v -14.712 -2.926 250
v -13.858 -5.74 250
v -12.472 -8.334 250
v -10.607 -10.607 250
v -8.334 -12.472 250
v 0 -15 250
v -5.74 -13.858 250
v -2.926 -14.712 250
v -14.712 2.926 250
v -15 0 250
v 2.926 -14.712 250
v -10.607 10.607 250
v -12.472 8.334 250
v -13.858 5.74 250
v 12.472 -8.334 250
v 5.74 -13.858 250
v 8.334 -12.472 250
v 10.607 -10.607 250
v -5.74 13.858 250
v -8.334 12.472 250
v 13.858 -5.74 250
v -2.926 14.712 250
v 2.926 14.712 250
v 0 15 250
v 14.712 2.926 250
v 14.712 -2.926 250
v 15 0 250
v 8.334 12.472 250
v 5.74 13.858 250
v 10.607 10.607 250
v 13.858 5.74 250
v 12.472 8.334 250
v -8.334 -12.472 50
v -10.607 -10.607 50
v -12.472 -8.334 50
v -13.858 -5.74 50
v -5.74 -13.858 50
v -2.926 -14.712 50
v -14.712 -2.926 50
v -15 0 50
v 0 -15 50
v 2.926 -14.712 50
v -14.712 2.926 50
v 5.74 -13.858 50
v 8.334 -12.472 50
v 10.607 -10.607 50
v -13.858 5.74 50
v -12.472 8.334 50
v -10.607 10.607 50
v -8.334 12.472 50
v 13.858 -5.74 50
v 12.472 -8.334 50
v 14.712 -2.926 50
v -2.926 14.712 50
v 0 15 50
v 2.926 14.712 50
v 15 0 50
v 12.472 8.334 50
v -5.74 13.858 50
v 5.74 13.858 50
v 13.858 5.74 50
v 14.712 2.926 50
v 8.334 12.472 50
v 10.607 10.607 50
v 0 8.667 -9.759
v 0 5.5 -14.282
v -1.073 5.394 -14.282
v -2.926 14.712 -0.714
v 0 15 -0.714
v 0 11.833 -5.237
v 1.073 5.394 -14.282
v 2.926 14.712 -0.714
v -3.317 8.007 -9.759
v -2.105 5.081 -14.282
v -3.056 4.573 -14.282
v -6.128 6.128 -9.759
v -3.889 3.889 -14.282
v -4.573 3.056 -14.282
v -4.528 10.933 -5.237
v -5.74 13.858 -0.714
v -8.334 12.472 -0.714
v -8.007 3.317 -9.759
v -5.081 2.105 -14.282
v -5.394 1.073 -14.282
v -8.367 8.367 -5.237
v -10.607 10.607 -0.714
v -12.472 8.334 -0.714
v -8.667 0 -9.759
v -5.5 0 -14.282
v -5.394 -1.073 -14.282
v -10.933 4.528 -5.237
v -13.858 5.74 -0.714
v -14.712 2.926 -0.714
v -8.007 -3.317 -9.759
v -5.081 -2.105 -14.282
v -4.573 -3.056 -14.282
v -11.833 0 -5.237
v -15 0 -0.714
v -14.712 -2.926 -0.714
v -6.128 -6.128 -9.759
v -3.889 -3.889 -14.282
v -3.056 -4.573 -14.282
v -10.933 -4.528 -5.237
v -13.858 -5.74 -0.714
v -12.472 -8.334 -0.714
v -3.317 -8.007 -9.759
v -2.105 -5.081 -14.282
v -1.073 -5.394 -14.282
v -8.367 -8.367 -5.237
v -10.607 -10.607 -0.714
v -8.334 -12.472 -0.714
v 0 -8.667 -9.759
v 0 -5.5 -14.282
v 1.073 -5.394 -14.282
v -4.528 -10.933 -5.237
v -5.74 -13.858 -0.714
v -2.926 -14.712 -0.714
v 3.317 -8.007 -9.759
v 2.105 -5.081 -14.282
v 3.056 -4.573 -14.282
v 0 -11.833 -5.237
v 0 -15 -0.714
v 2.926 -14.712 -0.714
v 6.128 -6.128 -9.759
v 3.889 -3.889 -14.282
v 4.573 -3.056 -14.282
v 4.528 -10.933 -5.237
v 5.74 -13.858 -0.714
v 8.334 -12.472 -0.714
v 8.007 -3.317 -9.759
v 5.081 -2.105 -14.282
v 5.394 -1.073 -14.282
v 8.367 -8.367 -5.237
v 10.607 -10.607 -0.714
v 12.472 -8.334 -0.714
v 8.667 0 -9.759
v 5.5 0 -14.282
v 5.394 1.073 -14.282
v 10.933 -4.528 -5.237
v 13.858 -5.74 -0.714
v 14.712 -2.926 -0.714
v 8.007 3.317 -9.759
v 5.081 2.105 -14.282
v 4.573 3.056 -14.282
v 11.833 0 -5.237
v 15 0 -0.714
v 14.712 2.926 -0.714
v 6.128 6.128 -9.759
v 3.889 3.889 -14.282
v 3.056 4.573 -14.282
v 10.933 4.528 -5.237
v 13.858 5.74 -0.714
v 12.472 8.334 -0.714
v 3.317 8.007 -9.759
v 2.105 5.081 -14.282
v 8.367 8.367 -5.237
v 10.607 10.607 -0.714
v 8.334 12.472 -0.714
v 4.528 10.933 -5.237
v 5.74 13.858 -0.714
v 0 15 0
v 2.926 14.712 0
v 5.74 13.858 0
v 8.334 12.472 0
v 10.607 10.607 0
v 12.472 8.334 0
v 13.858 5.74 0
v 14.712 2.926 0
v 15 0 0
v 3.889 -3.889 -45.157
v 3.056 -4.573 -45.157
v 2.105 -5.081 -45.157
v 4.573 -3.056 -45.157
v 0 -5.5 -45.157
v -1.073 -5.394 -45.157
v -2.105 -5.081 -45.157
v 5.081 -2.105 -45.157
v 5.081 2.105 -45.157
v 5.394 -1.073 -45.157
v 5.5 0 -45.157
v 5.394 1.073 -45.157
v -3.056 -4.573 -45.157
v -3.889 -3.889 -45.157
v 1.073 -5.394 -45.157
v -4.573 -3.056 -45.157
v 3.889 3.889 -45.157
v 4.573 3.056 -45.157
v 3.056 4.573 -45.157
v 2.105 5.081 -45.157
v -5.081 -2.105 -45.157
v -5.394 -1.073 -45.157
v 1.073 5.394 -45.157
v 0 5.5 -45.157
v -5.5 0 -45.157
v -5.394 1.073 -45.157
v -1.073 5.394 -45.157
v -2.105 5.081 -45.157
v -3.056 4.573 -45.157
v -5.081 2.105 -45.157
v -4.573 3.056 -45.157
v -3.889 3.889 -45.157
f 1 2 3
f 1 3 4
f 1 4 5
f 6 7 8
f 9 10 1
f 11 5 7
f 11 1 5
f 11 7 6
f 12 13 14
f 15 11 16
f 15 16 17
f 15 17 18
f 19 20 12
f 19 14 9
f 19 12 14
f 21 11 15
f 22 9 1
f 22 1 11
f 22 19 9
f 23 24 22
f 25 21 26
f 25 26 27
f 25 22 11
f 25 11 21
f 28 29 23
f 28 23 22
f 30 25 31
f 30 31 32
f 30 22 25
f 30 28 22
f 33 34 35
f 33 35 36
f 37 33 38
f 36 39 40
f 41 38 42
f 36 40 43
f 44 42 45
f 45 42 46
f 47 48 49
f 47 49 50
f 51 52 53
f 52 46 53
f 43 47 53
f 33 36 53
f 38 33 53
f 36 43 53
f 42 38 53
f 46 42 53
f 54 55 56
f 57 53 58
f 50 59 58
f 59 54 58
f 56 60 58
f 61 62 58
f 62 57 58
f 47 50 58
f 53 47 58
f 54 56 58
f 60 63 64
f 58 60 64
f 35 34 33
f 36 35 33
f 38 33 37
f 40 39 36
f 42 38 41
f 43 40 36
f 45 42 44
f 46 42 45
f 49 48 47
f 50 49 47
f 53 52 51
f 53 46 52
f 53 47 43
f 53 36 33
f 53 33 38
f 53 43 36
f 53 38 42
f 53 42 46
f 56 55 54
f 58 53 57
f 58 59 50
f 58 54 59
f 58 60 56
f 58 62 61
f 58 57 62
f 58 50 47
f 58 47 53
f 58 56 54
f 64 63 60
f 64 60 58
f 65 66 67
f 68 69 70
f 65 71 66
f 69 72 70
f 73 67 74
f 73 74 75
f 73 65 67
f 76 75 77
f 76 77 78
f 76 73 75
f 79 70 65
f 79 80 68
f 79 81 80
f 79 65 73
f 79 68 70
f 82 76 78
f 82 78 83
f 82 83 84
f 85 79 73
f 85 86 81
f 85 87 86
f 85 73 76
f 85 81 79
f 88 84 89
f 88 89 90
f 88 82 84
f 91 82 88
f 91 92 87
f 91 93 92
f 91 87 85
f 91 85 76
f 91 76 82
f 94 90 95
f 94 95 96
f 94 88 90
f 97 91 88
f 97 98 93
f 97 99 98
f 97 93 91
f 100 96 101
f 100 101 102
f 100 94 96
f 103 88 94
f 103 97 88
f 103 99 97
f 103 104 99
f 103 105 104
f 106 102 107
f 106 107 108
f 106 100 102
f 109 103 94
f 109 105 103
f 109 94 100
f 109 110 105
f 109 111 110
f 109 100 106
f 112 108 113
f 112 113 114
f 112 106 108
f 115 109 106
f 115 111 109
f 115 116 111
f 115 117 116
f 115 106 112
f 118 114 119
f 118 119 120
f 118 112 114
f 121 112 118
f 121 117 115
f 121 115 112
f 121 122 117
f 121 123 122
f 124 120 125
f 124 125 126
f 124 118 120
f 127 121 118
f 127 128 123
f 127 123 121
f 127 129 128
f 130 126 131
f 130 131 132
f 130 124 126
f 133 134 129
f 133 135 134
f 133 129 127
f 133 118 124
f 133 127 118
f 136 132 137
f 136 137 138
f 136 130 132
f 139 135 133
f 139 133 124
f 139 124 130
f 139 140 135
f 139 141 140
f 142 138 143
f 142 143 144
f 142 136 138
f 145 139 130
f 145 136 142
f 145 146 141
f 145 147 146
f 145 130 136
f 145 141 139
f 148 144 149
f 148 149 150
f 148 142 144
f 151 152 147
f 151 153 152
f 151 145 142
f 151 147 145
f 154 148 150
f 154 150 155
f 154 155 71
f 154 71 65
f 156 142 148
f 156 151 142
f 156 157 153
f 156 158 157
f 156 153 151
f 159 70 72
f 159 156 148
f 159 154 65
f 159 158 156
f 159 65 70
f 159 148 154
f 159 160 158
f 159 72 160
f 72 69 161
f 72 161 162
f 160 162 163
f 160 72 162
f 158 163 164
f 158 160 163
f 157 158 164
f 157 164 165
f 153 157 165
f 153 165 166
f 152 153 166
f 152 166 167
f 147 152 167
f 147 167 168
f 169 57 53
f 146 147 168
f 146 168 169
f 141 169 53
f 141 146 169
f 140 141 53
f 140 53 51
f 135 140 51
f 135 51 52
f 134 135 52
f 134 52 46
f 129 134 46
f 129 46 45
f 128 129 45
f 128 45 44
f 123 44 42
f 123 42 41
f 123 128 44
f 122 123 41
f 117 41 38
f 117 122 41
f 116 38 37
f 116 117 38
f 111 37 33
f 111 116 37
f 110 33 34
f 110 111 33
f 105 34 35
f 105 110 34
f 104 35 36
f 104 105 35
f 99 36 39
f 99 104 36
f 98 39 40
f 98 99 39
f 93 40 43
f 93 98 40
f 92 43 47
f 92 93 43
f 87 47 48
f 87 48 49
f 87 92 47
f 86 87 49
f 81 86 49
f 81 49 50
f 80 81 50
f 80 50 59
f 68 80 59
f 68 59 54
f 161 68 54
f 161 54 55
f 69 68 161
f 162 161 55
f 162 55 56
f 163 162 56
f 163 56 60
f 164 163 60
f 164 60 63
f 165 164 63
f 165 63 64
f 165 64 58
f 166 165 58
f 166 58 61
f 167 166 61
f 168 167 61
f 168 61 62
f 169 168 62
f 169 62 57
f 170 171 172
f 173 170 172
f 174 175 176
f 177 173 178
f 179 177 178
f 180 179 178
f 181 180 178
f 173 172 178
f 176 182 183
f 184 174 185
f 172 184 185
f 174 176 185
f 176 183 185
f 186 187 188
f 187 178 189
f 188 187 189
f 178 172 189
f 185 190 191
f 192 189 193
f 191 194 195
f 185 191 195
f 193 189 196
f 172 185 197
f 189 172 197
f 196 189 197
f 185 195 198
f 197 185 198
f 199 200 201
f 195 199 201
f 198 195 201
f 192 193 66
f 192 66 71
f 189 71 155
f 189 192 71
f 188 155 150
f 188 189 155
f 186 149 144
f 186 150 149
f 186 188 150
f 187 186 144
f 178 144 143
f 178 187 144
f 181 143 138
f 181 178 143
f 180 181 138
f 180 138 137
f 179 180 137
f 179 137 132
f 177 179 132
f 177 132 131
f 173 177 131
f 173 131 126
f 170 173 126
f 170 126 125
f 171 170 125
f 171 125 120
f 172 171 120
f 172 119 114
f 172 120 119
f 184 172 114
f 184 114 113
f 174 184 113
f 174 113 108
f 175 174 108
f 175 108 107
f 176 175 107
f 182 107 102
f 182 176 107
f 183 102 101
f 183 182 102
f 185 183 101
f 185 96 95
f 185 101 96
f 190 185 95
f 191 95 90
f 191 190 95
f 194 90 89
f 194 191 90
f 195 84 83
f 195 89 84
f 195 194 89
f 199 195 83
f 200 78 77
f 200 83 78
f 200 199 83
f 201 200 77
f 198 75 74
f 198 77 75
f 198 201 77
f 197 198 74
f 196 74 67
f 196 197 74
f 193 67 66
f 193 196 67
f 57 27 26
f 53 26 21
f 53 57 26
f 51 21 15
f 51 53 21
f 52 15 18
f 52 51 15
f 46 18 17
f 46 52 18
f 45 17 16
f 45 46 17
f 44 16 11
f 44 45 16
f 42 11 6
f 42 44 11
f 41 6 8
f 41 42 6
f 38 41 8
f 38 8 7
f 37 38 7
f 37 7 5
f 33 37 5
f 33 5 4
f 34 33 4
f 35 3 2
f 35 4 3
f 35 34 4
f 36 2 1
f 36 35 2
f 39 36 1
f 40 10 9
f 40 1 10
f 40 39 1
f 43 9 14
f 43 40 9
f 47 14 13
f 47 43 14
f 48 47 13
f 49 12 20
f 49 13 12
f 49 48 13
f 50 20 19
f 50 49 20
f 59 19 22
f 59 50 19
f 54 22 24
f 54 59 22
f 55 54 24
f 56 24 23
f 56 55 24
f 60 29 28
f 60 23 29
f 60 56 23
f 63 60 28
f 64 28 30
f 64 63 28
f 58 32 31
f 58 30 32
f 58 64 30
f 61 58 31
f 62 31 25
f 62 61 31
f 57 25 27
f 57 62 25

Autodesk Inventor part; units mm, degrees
ref_plane "YZ Plane" through (0, 0, 0) normal (1, 0, 0) x (0, 1, 0)
ref_plane "XZ Plane" through (0, 0, 0) normal (0, 1, 0) x (-1, 0, 0)
sketch "Sketch1" plane through (0, 0, 0) normal (1, 0, 0) x (0, 1, 0)
  line L0 (0, 0) -> (15, 0)
  line L1 (0, 0) -> (5.5, 0)
  line L2 (0, 0) -> (11, 0)
  line L3 (15, -0.7141) -> (5.5, -14.2815)
  line L4 (15.5, 0) -> (35.4603, 0) construction
  line L5 (5.5, -14.2815) -> (5.5, -19.2815)
  line L6 (5.5, -19.2815) -> (11, -45.1569) construction
  line L7 (5.5, -19.2815) -> (64.4036, -19.2815) construction
  line L8 (0, 0) -> (11, 0)
  line L9 (11, 0) -> (11, -45.1569) construction
  line L10 (5.5, -19.2815) -> (5.5, -62.0623)
  line L11 (5.5, -45.1569) -> (0, -45.1569)
  line L12 (0, 0) -> (0, -45.1569)
  line L13 (0, -74.4747) -> (0, 12.4125) projected
  line L14 (0, 0) -> (15, 0)
  line L15 (15, 0) -> (15, -0.7141)
  line L16 (15, -19.2815) -> (15, -27.5658)
  dimension "d17" = 5.5
  dimension "d22" = 15.5
  dimension "d23" = 125
  dimension "d24" = 5
  dimension "d25" = 78
  dimension "d27" = 11
  dimension "d28" = 45.157
  dimension "d30" = 15
revolve "Revolution2" add sketch "Sketch1" angle 360 about axis through (0, 0, -10) along (0, 0, 1)
sketch "Sketch2" plane through (0, 0, 0) normal (0, 0, 1) x (1, 0, 0)
  circle A0 centre (0, 0) radius 15
  dimension "d31" = 30
extrude "Extrusion1" add sketch "Sketch2" along normal blind 250
ref_plane "Work Plane1" through (0, 0, 50) normal (0, 0, 1) x (1, 0, 0)
split body "Split1" result two bodies by plane through (0, 0, 50) normal (0, 0, 1) first body at (14.453, -1.1668, 183.3333)
properties part number "nozzle mould tool"
